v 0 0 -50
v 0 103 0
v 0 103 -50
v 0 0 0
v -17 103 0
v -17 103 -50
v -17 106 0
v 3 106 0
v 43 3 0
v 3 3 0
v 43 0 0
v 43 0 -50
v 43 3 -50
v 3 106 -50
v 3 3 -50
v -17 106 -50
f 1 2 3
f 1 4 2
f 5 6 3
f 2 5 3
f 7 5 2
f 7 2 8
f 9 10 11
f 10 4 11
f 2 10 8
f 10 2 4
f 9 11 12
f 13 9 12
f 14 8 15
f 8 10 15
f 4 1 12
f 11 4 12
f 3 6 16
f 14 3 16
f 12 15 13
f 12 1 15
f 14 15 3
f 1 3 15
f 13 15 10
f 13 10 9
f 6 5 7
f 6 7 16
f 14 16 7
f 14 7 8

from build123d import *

# Parameters (mm, degrees)
SKETCH1_W      = 43
SKETCH1_H      = 50
EXTRUDE1_DEPTH = 3
SKETCH2_W      = 3
SKETCH2_H      = 50
EXTRUDE2_DEPTH = 100
SKETCH3_W      = 20
SKETCH3_H      = 50
EXTRUDE3_DEPTH = 3


with BuildPart() as part:
    # Sketch1 → Extrude1 (new body)
    with BuildSketch(Plane(origin=(0, 0, 0), x_dir=(1, 0, 0), z_dir=(0, 1, 0))):
        with Locations((21.5, 25)):
            Rectangle(SKETCH1_W, SKETCH1_H)
    extrude(amount=EXTRUDE1_DEPTH)

    # Sketch2 → Extrude2 (add)
    with BuildSketch(Plane(origin=(0, 3, 0), x_dir=(1, 0, 0), z_dir=(0, 1, 0))):
        with Locations((1.5, 25)):
            Rectangle(SKETCH2_W, SKETCH2_H)
    extrude(amount=EXTRUDE2_DEPTH)

    # Sketch3 → Extrude3 (add)
    with BuildSketch(Plane(origin=(0, 103, 0), x_dir=(1, 0, 0), z_dir=(0, 1, 0))):
        with Locations((-7, 25)):
            Rectangle(SKETCH3_W, SKETCH3_H)
    extrude(amount=EXTRUDE3_DEPTH)


solid = part.part
